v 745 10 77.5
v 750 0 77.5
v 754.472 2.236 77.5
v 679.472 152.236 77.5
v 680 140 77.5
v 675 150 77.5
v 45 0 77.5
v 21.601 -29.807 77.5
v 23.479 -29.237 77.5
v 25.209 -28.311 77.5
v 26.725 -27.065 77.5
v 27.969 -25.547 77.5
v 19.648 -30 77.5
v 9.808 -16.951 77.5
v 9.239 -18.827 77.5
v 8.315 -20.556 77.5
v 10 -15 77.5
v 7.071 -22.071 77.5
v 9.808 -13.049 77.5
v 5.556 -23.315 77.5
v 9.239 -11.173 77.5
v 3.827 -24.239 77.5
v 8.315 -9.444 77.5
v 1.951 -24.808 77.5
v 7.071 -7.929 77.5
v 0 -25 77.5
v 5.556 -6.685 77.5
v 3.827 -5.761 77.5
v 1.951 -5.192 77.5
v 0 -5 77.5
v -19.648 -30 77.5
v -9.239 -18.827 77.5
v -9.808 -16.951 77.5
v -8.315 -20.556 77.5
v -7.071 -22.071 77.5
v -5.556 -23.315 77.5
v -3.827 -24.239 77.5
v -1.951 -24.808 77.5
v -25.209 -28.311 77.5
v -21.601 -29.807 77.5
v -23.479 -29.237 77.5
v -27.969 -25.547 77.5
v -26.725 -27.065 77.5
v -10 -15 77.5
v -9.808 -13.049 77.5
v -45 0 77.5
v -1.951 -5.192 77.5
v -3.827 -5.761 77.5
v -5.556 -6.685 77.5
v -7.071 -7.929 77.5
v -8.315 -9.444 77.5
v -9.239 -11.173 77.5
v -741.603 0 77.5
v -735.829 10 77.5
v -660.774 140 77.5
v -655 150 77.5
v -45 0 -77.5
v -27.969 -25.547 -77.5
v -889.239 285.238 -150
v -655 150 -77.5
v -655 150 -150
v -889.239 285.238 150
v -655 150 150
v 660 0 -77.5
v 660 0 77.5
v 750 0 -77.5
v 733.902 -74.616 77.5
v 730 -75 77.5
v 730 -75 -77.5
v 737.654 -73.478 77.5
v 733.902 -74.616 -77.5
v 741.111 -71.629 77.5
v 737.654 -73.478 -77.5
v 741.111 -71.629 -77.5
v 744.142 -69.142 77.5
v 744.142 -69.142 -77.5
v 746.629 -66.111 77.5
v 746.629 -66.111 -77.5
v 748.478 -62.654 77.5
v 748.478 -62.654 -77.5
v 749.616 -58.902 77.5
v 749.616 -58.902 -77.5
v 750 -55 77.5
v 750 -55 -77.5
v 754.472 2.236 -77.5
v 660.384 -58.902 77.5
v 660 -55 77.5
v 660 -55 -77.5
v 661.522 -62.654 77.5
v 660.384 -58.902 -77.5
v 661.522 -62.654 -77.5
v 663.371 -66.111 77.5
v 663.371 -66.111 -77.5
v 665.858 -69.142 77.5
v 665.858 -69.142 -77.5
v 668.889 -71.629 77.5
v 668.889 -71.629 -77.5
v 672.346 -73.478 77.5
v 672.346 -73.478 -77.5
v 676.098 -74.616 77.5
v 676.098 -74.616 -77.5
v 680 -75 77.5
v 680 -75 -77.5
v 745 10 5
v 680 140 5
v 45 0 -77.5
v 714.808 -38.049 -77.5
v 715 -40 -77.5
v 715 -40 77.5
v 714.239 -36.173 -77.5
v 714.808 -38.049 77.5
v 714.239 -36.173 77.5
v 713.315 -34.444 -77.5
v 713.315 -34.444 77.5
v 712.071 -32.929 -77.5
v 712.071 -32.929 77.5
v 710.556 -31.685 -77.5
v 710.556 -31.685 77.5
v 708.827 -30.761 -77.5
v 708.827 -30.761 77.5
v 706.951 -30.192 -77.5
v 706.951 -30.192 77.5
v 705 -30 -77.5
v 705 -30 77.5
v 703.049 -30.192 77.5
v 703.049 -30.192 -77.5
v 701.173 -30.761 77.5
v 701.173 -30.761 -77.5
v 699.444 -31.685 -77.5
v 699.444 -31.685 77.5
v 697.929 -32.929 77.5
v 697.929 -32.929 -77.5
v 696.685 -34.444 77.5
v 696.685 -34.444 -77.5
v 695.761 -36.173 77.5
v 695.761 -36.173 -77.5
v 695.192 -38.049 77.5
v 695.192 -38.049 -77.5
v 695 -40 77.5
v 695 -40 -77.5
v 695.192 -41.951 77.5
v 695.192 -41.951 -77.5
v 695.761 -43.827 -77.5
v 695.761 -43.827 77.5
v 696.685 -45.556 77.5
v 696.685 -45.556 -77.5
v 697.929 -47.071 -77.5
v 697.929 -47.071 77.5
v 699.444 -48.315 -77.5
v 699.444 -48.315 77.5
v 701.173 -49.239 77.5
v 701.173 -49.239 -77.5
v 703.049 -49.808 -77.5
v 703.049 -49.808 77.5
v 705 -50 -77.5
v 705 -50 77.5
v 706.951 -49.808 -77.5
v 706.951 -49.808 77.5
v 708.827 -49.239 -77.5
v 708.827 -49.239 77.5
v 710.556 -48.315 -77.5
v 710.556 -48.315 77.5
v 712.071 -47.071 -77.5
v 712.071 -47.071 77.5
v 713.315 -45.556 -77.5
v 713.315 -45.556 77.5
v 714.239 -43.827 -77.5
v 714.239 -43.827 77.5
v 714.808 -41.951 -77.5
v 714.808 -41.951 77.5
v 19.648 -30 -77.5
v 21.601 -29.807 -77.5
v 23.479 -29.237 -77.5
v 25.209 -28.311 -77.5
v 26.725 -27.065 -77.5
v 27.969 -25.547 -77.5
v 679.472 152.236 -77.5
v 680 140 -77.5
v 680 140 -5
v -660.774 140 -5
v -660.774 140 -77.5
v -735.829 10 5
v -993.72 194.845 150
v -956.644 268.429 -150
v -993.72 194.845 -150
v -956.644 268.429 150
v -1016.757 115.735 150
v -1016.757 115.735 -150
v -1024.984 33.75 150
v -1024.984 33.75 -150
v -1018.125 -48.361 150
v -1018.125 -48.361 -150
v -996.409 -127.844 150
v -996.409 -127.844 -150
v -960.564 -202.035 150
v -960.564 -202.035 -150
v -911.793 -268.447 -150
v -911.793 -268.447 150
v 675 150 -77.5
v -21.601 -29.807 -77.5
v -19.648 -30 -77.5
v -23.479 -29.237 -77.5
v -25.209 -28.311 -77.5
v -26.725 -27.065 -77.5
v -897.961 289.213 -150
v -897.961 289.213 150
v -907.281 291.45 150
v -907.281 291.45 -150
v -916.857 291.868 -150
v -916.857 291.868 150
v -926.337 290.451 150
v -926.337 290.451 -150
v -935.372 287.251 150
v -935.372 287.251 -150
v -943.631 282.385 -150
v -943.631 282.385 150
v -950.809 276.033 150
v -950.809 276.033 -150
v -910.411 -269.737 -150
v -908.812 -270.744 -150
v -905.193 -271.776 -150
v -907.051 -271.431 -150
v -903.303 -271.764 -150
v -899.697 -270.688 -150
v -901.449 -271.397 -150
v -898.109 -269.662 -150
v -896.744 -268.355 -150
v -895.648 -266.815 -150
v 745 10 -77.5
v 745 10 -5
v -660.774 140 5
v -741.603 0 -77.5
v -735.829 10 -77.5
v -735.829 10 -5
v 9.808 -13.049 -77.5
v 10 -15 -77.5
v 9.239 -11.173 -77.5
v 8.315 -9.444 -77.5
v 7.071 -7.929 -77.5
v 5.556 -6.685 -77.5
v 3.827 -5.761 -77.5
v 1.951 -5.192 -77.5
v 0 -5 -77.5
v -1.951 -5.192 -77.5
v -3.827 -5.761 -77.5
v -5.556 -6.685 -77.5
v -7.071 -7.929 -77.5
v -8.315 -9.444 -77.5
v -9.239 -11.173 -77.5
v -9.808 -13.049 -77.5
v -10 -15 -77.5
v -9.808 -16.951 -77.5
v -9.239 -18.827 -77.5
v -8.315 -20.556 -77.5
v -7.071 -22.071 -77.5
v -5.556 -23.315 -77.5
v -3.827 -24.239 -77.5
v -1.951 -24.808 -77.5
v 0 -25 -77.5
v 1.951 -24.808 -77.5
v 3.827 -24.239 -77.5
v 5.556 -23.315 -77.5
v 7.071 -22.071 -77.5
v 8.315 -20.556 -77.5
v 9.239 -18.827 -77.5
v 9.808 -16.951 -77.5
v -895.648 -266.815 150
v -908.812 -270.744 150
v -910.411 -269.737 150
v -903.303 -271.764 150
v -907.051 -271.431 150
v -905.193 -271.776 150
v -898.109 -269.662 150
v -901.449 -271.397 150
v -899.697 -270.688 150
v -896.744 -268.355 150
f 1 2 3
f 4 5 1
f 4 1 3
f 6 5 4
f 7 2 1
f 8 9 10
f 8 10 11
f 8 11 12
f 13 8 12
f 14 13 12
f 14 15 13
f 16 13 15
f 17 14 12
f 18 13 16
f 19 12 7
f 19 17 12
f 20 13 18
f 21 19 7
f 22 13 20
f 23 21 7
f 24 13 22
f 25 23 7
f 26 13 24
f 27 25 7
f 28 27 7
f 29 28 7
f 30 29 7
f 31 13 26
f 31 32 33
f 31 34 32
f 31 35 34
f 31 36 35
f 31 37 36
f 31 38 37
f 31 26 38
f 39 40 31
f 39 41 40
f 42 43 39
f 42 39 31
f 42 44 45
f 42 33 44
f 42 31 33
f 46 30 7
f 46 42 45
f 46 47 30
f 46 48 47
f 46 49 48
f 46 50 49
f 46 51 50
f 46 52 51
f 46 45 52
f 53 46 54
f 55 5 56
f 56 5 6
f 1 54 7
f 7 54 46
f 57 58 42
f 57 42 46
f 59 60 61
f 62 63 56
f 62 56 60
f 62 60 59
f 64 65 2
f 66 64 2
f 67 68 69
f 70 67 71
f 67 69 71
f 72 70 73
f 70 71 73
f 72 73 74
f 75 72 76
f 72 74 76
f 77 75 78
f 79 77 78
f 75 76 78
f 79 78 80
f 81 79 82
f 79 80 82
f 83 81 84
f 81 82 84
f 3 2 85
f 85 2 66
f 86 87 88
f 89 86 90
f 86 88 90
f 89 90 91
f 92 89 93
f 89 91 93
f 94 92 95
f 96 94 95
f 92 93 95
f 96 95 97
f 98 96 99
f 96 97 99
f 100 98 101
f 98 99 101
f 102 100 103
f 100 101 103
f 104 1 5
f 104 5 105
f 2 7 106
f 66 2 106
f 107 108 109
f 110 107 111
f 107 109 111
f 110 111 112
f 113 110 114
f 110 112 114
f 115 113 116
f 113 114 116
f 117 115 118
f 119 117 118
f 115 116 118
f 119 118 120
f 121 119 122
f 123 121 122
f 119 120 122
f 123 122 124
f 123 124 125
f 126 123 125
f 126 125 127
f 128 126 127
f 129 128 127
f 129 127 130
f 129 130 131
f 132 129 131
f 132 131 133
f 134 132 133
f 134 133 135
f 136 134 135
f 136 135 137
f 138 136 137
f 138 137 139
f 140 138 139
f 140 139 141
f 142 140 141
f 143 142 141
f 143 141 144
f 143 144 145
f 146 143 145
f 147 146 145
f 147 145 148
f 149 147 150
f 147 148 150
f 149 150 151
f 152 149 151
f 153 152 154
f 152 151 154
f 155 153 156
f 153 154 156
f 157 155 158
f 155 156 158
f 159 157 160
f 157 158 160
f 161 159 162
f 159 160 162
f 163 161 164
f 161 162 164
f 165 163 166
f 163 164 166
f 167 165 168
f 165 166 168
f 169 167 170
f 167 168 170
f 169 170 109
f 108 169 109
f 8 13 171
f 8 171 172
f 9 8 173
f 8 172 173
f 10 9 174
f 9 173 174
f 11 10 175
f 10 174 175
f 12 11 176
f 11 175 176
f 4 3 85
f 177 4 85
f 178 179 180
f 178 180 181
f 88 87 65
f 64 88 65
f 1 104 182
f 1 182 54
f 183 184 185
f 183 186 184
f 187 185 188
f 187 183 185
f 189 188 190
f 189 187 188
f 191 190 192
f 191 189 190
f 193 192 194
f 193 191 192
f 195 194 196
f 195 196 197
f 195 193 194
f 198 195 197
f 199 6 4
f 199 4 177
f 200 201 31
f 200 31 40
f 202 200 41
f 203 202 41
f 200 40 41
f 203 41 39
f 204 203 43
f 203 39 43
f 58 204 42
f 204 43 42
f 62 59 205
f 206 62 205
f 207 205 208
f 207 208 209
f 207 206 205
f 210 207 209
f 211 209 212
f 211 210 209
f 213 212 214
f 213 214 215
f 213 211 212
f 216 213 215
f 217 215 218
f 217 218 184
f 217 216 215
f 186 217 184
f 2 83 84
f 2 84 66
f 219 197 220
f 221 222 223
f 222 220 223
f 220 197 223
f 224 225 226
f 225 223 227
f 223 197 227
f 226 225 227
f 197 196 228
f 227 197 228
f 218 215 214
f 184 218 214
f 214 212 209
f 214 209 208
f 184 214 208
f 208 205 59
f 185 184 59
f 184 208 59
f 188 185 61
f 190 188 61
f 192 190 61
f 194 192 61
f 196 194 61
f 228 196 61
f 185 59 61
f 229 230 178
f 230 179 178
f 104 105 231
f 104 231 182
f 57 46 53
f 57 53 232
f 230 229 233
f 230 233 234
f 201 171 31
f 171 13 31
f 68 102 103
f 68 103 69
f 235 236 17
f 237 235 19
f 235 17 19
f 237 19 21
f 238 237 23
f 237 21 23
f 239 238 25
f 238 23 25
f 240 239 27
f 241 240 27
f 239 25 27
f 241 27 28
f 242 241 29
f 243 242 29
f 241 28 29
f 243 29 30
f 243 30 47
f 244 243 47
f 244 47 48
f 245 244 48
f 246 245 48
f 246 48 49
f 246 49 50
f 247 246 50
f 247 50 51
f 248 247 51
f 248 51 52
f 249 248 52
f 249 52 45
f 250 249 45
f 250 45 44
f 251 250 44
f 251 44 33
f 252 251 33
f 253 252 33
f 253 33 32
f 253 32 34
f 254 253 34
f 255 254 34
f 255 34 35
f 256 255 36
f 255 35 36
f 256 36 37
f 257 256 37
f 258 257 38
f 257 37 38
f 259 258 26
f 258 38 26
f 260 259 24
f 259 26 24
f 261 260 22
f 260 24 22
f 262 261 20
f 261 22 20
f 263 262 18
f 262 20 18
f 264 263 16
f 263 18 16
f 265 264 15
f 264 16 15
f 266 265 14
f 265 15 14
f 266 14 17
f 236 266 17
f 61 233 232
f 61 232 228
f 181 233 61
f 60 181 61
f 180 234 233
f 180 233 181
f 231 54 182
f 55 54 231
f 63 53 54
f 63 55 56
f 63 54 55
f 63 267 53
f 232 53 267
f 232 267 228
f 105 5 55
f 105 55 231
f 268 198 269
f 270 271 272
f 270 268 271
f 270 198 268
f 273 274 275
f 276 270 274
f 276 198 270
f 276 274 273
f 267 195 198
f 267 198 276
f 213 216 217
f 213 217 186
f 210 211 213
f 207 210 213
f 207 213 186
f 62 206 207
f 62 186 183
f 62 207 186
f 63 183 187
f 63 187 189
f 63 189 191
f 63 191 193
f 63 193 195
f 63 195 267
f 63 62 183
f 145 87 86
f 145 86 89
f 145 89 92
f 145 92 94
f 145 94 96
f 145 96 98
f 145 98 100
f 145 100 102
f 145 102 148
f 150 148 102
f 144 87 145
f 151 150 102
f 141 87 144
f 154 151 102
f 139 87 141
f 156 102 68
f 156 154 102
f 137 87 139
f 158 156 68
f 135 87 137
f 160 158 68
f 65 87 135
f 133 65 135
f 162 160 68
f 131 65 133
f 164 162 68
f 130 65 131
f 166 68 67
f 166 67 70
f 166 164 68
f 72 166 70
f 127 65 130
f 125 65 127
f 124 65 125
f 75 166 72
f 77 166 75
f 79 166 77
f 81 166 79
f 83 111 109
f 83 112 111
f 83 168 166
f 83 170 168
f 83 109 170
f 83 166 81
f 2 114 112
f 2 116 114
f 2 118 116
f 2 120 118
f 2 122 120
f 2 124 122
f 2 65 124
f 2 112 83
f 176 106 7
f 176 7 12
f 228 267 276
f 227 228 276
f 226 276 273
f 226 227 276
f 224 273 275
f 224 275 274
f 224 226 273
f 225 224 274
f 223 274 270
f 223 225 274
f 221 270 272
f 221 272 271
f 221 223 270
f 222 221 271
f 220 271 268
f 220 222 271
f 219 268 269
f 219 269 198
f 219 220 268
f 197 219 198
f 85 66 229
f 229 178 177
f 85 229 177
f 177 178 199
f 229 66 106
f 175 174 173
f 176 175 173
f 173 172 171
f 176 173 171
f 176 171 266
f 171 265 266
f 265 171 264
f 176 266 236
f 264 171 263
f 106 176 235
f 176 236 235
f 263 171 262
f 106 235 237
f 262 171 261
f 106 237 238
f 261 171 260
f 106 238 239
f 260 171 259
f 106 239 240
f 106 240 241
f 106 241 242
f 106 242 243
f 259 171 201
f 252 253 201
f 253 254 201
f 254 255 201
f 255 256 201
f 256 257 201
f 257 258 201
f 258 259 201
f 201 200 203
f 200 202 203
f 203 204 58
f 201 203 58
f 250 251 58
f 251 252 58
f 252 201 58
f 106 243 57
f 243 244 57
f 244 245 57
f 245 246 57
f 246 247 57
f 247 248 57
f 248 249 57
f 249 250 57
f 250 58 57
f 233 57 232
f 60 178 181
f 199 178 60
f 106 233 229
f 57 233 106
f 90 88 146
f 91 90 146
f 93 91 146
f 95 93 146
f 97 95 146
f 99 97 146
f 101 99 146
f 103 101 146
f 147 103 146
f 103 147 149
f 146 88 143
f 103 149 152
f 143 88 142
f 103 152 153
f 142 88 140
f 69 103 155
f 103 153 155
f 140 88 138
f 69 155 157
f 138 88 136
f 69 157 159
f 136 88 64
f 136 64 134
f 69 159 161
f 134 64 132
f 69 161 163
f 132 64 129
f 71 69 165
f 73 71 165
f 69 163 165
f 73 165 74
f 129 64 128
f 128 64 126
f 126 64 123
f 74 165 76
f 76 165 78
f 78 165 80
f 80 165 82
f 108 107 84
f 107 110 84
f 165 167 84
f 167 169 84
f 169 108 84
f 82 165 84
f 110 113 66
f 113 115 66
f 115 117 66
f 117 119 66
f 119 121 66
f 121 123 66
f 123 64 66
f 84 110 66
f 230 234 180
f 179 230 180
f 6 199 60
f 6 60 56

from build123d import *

# Parameters (mm, degrees)
BOSS_EXTRUDE1_DEPTH      = 77.5
FILLET1_R                = 10
SKETCH2_R                = 10
CUT_EXTRUDE1_DEPTH       = 156
BOSS_EXTRUDE2_DEPTH      = 750
BOSS_EXTRUDE2_DEPTH_BACK = 750
BOSS_EXTRUDE3_DEPTH      = 150
FILLET2_R                = 50
FILLET3_R                = 10
CUT_EXTRUDE2_DEPTH       = 150
SKETCH6_W                = 155
SKETCH6_H                = 167.705098313
BOSS_EXTRUDE4_DEPTH      = 5
SKETCH7_W                = 90
SKETCH7_H                = 75
BOSS_EXTRUDE5_DEPTH      = 155
FILLET4_R                = 20
SKETCH8_R                = 10
CUT_EXTRUDE3_DEPTH       = 228.5


with BuildPart() as part:
    # Sketch1 → Boss-Extrude1 (new body, symmetric)
    with BuildSketch(Plane.XY):
        Polygon((-45, 0), (45, 0), (25, -30), (-25, -30), align=None)
    extrude(amount=BOSS_EXTRUDE1_DEPTH, both=True)

    # Fillet1
    fillet1_edges = [part.edges().sort_by_distance(p)[0] for p in [
        (25, -30, 0),
        (-25, -30, 0),
    ]]
    fillet(fillet1_edges, radius=FILLET1_R)

    # Sketch2 → Cut-Extrude1 (cut, through all)
    with BuildSketch(Plane.XY.offset(77.5)):
        with Locations((0, -15)):
            Circle(SKETCH2_R)
    extrude(amount=-CUT_EXTRUDE1_DEPTH, mode=Mode.SUBTRACT)

    # Sketch3 → Boss-Extrude2 (add, two sides)
    with BuildSketch(Plane(origin=(0, 0, 0), x_dir=(0, 0, -1), z_dir=(1, 0, 0))) as boss_extrude2_sk:
        Polygon((-77.5, 0), (77.5, 0), (77.5, 10), (5, 10), (5, 140), (77.5, 140), (77.5, 150), (-77.5, 150), (-77.5, 140), (-5, 140), (-5, 10), (-77.5, 10), align=None)
    extrude(amount=BOSS_EXTRUDE2_DEPTH)
    extrude(boss_extrude2_sk.sketch, amount=-BOSS_EXTRUDE2_DEPTH_BACK)

    # Sketch4 → Boss-Extrude3 (add, symmetric)
    with BuildSketch(Plane.XY):
        with BuildLine():
            Line((-655, 150), (-928.797964194, 308.077328331))
            ThreePointArc((-928.797964194, 308.077328331), (-1024.547831071, 9.832015989), (-902.476115452, -278.641205623))
            Line((-902.476115452, -278.641205623), (-655, 150))
        make_face()
    extrude(amount=BOSS_EXTRUDE3_DEPTH, both=True)

    # Fillet2
    fillet2_edges = [part.edges().sort_by_distance(p)[0] for p in [
        (-928.797964194, 308.077328331, 0),
    ]]
    fillet(fillet2_edges, radius=FILLET2_R)

    # Fillet3
    fillet3_edges = [part.edges().sort_by_distance(p)[0] for p in [
        (-902.476115452, -278.641205623, 0),
    ]]
    fillet(fillet3_edges, radius=FILLET3_R)

    # Sketch5 → Cut-Extrude2 (cut, symmetric)
    with BuildSketch(Plane.XY.offset(5)):
        Polygon((750, 0), (675, 150), (750, 150), align=None)
    extrude(amount=CUT_EXTRUDE2_DEPTH, both=True, mode=Mode.SUBTRACT)

    # Sketch6 → Boss-Extrude4 (add)
    with BuildSketch(Plane(origin=(600, 300, 0), x_dir=(0, 0, -1), z_dir=(0.894427191, 0.447213595, 0))):
        with Locations((0, -251.557647469)):
            Rectangle(SKETCH6_W, SKETCH6_H)
    extrude(amount=BOSS_EXTRUDE4_DEPTH)


with BuildPart() as body_2:
    # Sketch7 → Boss-Extrude5 (new body)
    with BuildSketch(Plane.XY.offset(77.5)):
        with Locations((705, -37.5)):
            Rectangle(SKETCH7_W, SKETCH7_H)
    extrude(amount=-BOSS_EXTRUDE5_DEPTH)

    # Fillet4
    fillet4_edges = [body_2.edges().sort_by_distance(p)[0] for p in [
        (660, -75, 0),
        (750, -75, 0),
    ]]
    fillet(fillet4_edges, radius=FILLET4_R)

    # Sketch8 → Cut-Extrude3 (cut, through all)
    with BuildSketch(Plane.XY.offset(77.5)):
        with Locations((705, -40)):
            Circle(SKETCH8_R)
    extrude(amount=-CUT_EXTRUDE3_DEPTH, mode=Mode.SUBTRACT)


solid = Compound([part.part, body_2.part])
